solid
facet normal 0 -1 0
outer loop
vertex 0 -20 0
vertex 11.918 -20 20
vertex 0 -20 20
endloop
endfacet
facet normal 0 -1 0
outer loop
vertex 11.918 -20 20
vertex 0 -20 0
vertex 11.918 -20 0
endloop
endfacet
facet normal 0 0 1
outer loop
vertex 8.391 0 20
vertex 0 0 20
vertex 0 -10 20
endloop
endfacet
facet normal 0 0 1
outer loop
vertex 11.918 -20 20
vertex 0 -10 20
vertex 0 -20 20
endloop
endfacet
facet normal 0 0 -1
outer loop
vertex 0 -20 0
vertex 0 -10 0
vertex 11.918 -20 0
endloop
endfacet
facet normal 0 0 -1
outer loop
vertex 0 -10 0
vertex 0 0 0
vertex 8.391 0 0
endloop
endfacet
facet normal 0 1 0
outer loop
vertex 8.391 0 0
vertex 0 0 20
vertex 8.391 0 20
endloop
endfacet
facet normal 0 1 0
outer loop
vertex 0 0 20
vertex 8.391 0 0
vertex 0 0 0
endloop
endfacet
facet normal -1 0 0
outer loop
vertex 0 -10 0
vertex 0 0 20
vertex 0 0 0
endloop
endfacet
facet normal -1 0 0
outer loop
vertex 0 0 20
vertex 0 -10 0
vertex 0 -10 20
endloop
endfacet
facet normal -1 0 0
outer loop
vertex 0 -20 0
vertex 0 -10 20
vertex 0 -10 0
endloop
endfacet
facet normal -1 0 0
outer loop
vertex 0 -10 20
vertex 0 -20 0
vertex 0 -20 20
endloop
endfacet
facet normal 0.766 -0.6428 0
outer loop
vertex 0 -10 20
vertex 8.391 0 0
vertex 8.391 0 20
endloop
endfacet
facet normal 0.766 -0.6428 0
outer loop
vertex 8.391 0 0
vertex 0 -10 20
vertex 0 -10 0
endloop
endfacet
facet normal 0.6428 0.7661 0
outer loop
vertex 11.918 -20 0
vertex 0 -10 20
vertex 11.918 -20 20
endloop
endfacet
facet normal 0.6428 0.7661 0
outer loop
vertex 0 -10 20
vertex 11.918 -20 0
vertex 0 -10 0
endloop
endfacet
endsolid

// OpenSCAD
rotate([0,0,-90]) {
    difference() {
        cube([20, 20, 20]);
        translate([10, 0, -1]) {
            rotate([0,0,50]) {
                cube([30, 30, 30]);
            }
        }
    }
}
